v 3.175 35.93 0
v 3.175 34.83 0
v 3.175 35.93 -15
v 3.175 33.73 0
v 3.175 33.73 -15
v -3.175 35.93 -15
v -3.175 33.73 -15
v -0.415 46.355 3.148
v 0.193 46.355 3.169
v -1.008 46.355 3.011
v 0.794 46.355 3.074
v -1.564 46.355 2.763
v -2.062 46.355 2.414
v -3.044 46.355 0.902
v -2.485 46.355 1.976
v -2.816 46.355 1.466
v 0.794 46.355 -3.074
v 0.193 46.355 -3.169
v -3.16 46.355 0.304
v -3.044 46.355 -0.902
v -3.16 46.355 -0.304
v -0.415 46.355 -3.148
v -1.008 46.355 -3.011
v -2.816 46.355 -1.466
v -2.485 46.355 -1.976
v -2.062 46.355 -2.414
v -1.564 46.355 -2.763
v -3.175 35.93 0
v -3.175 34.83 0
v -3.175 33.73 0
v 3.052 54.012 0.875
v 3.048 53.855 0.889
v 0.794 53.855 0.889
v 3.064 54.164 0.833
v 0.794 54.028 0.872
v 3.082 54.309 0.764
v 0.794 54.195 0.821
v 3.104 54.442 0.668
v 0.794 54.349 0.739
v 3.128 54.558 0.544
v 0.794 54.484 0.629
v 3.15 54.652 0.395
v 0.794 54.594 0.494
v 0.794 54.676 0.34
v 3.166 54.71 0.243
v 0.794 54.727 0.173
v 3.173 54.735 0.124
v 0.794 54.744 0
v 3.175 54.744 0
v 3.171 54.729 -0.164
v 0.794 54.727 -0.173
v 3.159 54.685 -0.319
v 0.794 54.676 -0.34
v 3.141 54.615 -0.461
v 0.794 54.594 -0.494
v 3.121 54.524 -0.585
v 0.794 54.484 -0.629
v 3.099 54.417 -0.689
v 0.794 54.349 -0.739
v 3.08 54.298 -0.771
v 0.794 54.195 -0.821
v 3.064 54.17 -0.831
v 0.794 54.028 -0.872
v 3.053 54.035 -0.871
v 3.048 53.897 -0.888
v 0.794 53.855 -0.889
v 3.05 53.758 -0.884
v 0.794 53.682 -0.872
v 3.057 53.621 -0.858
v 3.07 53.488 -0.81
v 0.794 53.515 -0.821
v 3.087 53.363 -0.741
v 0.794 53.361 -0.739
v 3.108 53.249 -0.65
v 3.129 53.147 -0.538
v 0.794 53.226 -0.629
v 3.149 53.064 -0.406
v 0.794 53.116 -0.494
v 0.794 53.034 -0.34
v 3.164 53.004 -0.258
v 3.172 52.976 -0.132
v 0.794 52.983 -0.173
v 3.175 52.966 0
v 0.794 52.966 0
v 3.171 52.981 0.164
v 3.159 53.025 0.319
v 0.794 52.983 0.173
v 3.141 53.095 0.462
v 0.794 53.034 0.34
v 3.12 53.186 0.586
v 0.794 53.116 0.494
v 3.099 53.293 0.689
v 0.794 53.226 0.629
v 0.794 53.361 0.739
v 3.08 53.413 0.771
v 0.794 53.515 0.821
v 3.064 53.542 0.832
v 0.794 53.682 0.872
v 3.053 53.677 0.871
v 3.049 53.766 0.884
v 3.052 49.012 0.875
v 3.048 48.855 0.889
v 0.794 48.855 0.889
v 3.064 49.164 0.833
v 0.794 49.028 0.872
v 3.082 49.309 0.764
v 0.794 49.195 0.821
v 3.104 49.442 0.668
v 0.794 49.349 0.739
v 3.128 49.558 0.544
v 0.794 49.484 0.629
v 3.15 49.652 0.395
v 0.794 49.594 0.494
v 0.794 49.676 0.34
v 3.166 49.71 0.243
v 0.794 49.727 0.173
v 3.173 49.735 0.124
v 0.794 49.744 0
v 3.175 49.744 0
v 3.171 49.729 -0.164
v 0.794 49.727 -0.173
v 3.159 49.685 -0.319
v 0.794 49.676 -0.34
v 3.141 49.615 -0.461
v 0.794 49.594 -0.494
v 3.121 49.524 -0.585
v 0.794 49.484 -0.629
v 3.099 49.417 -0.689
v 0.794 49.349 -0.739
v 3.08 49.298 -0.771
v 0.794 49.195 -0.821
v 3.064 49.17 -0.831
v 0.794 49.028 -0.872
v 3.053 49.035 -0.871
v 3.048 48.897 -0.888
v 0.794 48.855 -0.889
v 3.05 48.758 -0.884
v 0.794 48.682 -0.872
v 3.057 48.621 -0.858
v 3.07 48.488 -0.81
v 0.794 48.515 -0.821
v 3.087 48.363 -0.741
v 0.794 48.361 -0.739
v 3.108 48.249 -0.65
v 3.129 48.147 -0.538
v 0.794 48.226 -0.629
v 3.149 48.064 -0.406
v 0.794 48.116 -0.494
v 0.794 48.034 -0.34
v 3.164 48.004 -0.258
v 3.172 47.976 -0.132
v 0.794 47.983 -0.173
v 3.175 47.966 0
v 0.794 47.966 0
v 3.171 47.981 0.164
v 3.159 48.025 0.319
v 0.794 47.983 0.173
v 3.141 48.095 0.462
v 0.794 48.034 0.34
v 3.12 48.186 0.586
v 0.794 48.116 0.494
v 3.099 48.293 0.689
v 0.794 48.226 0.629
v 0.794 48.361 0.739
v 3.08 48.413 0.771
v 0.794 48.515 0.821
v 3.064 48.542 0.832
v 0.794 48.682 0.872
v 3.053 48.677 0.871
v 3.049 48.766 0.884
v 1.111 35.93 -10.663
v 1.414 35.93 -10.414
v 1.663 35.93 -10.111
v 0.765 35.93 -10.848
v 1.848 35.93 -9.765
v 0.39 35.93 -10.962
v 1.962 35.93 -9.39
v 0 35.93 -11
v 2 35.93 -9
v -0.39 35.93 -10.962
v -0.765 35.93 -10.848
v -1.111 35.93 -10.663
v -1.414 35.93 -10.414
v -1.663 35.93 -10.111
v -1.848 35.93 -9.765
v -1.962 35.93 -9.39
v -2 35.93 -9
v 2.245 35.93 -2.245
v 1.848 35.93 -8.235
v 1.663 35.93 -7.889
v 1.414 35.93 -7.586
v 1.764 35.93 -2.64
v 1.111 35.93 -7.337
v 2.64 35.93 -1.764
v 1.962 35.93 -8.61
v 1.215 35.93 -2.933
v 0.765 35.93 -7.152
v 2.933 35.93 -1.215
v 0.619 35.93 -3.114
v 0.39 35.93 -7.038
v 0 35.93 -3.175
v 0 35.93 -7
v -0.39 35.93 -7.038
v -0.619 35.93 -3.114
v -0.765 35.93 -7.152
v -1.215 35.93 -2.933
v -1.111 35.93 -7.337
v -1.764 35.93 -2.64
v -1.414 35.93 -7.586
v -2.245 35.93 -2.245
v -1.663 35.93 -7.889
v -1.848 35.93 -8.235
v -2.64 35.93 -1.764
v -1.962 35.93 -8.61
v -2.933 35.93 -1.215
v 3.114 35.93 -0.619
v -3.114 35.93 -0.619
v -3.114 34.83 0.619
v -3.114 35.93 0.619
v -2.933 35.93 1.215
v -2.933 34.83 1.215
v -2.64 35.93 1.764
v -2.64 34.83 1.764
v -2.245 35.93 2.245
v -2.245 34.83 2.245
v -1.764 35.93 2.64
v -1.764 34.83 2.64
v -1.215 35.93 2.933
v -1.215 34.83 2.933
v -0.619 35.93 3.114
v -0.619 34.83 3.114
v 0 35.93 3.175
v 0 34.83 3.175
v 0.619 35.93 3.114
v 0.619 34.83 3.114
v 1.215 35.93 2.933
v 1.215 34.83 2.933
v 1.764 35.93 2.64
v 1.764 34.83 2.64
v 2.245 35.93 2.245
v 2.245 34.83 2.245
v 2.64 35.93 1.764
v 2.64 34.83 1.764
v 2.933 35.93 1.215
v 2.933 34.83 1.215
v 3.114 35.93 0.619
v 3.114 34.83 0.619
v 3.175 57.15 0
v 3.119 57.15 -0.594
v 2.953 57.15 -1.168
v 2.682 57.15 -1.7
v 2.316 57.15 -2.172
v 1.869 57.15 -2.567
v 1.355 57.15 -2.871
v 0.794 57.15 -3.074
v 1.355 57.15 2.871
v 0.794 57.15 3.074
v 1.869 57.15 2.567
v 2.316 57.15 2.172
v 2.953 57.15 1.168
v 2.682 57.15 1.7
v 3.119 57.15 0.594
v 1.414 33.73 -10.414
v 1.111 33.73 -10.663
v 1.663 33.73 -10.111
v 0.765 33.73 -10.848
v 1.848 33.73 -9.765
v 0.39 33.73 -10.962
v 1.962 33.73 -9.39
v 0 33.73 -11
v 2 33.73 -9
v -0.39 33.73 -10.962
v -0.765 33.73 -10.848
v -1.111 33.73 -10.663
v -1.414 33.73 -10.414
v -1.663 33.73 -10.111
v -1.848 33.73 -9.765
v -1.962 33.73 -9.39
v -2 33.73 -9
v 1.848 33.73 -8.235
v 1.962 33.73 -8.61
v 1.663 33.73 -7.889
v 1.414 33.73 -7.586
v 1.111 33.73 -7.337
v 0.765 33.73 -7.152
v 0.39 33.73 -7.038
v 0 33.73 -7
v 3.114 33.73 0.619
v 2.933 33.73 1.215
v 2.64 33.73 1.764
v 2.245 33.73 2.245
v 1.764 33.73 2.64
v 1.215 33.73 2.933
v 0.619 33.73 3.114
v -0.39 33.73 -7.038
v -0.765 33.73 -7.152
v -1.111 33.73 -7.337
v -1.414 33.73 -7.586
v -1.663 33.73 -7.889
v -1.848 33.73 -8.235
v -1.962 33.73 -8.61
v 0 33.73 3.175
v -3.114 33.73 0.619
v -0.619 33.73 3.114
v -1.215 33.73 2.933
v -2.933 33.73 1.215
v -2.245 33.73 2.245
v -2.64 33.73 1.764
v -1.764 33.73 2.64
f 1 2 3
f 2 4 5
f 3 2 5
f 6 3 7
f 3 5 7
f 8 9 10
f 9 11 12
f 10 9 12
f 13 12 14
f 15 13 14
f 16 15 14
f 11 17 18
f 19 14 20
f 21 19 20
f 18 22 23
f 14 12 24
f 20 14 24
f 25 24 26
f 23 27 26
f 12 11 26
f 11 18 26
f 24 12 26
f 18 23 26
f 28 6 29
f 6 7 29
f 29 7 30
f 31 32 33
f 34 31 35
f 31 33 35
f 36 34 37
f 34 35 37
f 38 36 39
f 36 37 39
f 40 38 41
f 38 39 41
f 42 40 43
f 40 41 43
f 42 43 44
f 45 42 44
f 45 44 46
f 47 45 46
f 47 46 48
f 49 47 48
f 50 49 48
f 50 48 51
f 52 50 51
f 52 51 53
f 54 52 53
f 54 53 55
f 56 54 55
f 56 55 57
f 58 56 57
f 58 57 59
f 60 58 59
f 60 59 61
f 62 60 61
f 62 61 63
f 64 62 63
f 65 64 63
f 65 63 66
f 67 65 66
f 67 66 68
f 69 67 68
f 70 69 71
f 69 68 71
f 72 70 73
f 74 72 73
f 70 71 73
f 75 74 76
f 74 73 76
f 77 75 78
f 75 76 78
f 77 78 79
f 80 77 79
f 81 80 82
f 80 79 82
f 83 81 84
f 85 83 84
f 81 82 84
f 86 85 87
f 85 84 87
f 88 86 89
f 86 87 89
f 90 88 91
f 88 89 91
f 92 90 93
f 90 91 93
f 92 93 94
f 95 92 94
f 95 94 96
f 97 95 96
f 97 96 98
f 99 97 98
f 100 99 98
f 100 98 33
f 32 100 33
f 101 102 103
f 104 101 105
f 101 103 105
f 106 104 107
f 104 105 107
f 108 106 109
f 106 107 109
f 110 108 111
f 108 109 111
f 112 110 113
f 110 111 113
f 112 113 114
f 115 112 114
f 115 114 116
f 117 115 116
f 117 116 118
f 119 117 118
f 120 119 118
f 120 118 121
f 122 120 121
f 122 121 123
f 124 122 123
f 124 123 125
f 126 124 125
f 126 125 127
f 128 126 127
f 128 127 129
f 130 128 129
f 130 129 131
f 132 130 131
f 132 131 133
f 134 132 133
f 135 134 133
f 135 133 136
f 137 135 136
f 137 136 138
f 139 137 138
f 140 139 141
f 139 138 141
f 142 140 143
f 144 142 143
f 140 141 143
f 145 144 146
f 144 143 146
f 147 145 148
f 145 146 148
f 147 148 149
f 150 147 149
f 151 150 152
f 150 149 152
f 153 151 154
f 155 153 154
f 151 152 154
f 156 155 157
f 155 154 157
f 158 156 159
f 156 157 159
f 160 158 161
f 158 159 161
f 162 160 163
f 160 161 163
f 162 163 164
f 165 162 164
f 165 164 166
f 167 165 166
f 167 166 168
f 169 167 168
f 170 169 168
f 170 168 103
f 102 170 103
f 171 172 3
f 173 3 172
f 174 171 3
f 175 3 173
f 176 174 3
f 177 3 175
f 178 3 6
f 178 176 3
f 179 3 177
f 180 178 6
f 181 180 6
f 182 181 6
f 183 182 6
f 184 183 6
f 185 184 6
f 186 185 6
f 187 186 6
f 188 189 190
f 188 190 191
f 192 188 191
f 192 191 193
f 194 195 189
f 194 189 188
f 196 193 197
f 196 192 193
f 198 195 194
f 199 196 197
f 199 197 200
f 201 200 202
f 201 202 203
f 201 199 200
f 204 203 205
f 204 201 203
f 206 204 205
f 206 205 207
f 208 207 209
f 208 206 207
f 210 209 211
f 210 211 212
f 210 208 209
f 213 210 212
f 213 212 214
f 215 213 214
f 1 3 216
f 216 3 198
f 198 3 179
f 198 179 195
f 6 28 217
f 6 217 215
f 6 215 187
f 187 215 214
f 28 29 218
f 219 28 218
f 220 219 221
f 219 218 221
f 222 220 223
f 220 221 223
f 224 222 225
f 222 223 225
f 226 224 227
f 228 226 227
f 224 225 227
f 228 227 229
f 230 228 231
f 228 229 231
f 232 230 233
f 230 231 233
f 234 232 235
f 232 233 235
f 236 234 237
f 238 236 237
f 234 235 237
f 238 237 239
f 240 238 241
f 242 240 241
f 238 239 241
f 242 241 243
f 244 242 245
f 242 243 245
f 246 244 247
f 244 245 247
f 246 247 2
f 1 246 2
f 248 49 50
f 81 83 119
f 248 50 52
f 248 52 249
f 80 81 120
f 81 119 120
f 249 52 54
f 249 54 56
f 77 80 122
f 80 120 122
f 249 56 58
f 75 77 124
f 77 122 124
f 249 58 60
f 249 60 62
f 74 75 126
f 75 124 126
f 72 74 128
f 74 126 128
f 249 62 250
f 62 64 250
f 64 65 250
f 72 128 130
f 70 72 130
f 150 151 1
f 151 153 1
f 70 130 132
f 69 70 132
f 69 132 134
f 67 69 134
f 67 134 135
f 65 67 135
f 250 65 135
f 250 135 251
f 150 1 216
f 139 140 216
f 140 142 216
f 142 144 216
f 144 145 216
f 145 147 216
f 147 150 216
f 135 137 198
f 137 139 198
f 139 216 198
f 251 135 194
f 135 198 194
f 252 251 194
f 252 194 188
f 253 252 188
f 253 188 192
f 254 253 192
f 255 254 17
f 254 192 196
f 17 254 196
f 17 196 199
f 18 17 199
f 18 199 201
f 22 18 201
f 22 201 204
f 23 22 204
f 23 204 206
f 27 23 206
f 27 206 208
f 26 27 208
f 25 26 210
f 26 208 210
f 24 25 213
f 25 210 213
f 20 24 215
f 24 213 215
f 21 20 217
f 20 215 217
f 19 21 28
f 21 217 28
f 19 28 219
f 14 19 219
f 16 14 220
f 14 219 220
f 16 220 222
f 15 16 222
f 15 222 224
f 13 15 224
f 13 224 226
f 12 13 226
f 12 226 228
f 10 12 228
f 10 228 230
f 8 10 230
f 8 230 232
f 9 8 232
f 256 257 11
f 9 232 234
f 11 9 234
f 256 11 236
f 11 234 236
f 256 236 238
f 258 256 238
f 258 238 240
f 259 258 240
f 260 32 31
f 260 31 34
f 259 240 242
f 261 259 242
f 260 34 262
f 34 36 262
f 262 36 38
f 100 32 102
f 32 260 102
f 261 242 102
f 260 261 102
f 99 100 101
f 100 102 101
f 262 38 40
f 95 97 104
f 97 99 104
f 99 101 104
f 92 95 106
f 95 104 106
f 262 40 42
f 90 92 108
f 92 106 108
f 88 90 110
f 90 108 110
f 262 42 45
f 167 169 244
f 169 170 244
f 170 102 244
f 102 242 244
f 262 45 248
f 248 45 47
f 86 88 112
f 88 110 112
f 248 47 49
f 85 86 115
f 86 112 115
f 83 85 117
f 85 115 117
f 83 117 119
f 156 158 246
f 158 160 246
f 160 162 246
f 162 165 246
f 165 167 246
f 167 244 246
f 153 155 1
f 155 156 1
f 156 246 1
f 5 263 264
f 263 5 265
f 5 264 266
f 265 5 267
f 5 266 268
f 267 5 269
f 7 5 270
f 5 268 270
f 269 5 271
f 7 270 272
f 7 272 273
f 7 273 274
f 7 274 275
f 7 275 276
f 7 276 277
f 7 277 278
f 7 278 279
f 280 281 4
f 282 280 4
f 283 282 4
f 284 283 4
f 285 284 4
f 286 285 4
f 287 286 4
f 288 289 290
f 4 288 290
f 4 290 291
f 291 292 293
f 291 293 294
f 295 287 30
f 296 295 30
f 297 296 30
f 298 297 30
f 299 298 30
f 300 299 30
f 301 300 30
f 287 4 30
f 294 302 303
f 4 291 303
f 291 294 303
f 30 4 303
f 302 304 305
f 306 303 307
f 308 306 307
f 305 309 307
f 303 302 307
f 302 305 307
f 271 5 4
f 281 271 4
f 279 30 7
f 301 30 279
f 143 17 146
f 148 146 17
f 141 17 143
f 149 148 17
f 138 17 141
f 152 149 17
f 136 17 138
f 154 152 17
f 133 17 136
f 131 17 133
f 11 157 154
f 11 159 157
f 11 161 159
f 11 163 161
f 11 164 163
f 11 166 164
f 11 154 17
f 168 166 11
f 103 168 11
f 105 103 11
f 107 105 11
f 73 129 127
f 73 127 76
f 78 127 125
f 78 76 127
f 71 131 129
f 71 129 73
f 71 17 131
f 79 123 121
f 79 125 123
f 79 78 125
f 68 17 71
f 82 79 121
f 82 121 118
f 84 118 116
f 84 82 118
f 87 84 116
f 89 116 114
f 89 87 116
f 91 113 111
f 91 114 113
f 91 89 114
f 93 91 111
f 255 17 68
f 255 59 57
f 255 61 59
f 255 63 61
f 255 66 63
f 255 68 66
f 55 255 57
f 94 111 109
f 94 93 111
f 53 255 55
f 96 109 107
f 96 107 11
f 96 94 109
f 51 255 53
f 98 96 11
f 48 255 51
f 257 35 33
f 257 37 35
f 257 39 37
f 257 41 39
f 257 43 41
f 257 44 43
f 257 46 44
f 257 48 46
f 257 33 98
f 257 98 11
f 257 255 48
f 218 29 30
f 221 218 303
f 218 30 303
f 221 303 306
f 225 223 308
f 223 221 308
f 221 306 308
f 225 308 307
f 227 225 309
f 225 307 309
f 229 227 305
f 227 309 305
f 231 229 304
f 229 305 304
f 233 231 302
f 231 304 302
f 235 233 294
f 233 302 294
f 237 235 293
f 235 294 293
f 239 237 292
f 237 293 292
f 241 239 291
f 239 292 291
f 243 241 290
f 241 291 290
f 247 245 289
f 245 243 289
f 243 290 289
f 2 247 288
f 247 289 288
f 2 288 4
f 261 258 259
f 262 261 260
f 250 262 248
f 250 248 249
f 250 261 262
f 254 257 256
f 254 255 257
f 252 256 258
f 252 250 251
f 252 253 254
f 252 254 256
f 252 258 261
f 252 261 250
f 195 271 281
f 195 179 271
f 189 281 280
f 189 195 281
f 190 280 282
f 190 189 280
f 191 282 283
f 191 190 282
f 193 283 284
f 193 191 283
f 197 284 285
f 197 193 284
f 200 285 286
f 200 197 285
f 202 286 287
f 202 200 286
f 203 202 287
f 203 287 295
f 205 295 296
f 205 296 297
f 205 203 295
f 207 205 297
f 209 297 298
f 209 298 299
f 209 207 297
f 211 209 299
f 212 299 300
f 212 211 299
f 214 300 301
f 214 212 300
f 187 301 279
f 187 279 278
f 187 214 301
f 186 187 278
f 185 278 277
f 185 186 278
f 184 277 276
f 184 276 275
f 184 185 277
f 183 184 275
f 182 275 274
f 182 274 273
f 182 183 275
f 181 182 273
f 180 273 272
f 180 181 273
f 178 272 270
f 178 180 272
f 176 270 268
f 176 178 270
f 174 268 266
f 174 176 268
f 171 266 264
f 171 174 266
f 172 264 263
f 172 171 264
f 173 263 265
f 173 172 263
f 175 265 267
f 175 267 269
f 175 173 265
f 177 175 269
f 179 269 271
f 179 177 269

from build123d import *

# Parameters (mm, degrees)
SKETCH_1_R          = 3.175
EXTRUDE_1_DEPTH     = 57.15
CUT_EXTRUDE_1_DEPTH = 10.795
SKETCH_3_R          = 0.889
CUT_EXTRUDE_2_DEPTH = 10.795
SKETCH_4_R          = 3.175
CUT_EXTRUDE_3_DEPTH = 34.83
SKETCH_5_R          = 2
EXTRUDE_2_DEPTH     = 1.1


with BuildPart() as part:
    # 草图1 → 凸台-拉伸1 (new body)
    with BuildSketch(Plane(origin=(0, 0, 0), x_dir=(1, 0, 0), z_dir=(0, 1, 0))):
        Circle(SKETCH_1_R)
    extrude(amount=EXTRUDE_1_DEPTH)

    # 草图2 → 切除-拉伸1 (cut)
    with BuildSketch(Plane(origin=(0, 57.15, 0), x_dir=(1, 0, 0), z_dir=(0, 1, 0))):
        Polygon((-0.794, 3.175), (0.794, 3.175), (0.794, -3.175), (-3.175, -3.175), (-3.175, 3.175), align=None)
    extrude(amount=-CUT_EXTRUDE_1_DEPTH, mode=Mode.SUBTRACT)

    # 草图3 → 切除-拉伸2 (cut)
    with BuildSketch(Plane.ZY.offset(-0.794)):
        with Locations((0, 53.855)):
            Circle(SKETCH_3_R)
        with Locations((0, 48.855)):
            Circle(SKETCH_3_R)
    extrude(amount=-CUT_EXTRUDE_2_DEPTH, mode=Mode.SUBTRACT)

    # 草图4 → 切除-拉伸3 (cut)
    with BuildSketch(Plane.XZ):
        Circle(SKETCH_4_R)
    extrude(amount=-CUT_EXTRUDE_3_DEPTH, mode=Mode.SUBTRACT)

    # 草图5 → 凸台-拉伸2 (add, symmetric)
    with BuildSketch(Plane.XZ.offset(-34.83)):
        with BuildLine():
            Line((3.175, 0), (3.175, -15))
            Line((3.175, -15), (-3.175, -15))
            Line((-3.175, -15), (-3.175, 0))
            ThreePointArc((-3.175, 0), (0, 3.175), (3.175, 0))
        make_face()
        with Locations((0, -9)):
            Circle(SKETCH_5_R, mode=Mode.SUBTRACT)
    extrude(amount=EXTRUDE_2_DEPTH, both=True)


solid = part.part
